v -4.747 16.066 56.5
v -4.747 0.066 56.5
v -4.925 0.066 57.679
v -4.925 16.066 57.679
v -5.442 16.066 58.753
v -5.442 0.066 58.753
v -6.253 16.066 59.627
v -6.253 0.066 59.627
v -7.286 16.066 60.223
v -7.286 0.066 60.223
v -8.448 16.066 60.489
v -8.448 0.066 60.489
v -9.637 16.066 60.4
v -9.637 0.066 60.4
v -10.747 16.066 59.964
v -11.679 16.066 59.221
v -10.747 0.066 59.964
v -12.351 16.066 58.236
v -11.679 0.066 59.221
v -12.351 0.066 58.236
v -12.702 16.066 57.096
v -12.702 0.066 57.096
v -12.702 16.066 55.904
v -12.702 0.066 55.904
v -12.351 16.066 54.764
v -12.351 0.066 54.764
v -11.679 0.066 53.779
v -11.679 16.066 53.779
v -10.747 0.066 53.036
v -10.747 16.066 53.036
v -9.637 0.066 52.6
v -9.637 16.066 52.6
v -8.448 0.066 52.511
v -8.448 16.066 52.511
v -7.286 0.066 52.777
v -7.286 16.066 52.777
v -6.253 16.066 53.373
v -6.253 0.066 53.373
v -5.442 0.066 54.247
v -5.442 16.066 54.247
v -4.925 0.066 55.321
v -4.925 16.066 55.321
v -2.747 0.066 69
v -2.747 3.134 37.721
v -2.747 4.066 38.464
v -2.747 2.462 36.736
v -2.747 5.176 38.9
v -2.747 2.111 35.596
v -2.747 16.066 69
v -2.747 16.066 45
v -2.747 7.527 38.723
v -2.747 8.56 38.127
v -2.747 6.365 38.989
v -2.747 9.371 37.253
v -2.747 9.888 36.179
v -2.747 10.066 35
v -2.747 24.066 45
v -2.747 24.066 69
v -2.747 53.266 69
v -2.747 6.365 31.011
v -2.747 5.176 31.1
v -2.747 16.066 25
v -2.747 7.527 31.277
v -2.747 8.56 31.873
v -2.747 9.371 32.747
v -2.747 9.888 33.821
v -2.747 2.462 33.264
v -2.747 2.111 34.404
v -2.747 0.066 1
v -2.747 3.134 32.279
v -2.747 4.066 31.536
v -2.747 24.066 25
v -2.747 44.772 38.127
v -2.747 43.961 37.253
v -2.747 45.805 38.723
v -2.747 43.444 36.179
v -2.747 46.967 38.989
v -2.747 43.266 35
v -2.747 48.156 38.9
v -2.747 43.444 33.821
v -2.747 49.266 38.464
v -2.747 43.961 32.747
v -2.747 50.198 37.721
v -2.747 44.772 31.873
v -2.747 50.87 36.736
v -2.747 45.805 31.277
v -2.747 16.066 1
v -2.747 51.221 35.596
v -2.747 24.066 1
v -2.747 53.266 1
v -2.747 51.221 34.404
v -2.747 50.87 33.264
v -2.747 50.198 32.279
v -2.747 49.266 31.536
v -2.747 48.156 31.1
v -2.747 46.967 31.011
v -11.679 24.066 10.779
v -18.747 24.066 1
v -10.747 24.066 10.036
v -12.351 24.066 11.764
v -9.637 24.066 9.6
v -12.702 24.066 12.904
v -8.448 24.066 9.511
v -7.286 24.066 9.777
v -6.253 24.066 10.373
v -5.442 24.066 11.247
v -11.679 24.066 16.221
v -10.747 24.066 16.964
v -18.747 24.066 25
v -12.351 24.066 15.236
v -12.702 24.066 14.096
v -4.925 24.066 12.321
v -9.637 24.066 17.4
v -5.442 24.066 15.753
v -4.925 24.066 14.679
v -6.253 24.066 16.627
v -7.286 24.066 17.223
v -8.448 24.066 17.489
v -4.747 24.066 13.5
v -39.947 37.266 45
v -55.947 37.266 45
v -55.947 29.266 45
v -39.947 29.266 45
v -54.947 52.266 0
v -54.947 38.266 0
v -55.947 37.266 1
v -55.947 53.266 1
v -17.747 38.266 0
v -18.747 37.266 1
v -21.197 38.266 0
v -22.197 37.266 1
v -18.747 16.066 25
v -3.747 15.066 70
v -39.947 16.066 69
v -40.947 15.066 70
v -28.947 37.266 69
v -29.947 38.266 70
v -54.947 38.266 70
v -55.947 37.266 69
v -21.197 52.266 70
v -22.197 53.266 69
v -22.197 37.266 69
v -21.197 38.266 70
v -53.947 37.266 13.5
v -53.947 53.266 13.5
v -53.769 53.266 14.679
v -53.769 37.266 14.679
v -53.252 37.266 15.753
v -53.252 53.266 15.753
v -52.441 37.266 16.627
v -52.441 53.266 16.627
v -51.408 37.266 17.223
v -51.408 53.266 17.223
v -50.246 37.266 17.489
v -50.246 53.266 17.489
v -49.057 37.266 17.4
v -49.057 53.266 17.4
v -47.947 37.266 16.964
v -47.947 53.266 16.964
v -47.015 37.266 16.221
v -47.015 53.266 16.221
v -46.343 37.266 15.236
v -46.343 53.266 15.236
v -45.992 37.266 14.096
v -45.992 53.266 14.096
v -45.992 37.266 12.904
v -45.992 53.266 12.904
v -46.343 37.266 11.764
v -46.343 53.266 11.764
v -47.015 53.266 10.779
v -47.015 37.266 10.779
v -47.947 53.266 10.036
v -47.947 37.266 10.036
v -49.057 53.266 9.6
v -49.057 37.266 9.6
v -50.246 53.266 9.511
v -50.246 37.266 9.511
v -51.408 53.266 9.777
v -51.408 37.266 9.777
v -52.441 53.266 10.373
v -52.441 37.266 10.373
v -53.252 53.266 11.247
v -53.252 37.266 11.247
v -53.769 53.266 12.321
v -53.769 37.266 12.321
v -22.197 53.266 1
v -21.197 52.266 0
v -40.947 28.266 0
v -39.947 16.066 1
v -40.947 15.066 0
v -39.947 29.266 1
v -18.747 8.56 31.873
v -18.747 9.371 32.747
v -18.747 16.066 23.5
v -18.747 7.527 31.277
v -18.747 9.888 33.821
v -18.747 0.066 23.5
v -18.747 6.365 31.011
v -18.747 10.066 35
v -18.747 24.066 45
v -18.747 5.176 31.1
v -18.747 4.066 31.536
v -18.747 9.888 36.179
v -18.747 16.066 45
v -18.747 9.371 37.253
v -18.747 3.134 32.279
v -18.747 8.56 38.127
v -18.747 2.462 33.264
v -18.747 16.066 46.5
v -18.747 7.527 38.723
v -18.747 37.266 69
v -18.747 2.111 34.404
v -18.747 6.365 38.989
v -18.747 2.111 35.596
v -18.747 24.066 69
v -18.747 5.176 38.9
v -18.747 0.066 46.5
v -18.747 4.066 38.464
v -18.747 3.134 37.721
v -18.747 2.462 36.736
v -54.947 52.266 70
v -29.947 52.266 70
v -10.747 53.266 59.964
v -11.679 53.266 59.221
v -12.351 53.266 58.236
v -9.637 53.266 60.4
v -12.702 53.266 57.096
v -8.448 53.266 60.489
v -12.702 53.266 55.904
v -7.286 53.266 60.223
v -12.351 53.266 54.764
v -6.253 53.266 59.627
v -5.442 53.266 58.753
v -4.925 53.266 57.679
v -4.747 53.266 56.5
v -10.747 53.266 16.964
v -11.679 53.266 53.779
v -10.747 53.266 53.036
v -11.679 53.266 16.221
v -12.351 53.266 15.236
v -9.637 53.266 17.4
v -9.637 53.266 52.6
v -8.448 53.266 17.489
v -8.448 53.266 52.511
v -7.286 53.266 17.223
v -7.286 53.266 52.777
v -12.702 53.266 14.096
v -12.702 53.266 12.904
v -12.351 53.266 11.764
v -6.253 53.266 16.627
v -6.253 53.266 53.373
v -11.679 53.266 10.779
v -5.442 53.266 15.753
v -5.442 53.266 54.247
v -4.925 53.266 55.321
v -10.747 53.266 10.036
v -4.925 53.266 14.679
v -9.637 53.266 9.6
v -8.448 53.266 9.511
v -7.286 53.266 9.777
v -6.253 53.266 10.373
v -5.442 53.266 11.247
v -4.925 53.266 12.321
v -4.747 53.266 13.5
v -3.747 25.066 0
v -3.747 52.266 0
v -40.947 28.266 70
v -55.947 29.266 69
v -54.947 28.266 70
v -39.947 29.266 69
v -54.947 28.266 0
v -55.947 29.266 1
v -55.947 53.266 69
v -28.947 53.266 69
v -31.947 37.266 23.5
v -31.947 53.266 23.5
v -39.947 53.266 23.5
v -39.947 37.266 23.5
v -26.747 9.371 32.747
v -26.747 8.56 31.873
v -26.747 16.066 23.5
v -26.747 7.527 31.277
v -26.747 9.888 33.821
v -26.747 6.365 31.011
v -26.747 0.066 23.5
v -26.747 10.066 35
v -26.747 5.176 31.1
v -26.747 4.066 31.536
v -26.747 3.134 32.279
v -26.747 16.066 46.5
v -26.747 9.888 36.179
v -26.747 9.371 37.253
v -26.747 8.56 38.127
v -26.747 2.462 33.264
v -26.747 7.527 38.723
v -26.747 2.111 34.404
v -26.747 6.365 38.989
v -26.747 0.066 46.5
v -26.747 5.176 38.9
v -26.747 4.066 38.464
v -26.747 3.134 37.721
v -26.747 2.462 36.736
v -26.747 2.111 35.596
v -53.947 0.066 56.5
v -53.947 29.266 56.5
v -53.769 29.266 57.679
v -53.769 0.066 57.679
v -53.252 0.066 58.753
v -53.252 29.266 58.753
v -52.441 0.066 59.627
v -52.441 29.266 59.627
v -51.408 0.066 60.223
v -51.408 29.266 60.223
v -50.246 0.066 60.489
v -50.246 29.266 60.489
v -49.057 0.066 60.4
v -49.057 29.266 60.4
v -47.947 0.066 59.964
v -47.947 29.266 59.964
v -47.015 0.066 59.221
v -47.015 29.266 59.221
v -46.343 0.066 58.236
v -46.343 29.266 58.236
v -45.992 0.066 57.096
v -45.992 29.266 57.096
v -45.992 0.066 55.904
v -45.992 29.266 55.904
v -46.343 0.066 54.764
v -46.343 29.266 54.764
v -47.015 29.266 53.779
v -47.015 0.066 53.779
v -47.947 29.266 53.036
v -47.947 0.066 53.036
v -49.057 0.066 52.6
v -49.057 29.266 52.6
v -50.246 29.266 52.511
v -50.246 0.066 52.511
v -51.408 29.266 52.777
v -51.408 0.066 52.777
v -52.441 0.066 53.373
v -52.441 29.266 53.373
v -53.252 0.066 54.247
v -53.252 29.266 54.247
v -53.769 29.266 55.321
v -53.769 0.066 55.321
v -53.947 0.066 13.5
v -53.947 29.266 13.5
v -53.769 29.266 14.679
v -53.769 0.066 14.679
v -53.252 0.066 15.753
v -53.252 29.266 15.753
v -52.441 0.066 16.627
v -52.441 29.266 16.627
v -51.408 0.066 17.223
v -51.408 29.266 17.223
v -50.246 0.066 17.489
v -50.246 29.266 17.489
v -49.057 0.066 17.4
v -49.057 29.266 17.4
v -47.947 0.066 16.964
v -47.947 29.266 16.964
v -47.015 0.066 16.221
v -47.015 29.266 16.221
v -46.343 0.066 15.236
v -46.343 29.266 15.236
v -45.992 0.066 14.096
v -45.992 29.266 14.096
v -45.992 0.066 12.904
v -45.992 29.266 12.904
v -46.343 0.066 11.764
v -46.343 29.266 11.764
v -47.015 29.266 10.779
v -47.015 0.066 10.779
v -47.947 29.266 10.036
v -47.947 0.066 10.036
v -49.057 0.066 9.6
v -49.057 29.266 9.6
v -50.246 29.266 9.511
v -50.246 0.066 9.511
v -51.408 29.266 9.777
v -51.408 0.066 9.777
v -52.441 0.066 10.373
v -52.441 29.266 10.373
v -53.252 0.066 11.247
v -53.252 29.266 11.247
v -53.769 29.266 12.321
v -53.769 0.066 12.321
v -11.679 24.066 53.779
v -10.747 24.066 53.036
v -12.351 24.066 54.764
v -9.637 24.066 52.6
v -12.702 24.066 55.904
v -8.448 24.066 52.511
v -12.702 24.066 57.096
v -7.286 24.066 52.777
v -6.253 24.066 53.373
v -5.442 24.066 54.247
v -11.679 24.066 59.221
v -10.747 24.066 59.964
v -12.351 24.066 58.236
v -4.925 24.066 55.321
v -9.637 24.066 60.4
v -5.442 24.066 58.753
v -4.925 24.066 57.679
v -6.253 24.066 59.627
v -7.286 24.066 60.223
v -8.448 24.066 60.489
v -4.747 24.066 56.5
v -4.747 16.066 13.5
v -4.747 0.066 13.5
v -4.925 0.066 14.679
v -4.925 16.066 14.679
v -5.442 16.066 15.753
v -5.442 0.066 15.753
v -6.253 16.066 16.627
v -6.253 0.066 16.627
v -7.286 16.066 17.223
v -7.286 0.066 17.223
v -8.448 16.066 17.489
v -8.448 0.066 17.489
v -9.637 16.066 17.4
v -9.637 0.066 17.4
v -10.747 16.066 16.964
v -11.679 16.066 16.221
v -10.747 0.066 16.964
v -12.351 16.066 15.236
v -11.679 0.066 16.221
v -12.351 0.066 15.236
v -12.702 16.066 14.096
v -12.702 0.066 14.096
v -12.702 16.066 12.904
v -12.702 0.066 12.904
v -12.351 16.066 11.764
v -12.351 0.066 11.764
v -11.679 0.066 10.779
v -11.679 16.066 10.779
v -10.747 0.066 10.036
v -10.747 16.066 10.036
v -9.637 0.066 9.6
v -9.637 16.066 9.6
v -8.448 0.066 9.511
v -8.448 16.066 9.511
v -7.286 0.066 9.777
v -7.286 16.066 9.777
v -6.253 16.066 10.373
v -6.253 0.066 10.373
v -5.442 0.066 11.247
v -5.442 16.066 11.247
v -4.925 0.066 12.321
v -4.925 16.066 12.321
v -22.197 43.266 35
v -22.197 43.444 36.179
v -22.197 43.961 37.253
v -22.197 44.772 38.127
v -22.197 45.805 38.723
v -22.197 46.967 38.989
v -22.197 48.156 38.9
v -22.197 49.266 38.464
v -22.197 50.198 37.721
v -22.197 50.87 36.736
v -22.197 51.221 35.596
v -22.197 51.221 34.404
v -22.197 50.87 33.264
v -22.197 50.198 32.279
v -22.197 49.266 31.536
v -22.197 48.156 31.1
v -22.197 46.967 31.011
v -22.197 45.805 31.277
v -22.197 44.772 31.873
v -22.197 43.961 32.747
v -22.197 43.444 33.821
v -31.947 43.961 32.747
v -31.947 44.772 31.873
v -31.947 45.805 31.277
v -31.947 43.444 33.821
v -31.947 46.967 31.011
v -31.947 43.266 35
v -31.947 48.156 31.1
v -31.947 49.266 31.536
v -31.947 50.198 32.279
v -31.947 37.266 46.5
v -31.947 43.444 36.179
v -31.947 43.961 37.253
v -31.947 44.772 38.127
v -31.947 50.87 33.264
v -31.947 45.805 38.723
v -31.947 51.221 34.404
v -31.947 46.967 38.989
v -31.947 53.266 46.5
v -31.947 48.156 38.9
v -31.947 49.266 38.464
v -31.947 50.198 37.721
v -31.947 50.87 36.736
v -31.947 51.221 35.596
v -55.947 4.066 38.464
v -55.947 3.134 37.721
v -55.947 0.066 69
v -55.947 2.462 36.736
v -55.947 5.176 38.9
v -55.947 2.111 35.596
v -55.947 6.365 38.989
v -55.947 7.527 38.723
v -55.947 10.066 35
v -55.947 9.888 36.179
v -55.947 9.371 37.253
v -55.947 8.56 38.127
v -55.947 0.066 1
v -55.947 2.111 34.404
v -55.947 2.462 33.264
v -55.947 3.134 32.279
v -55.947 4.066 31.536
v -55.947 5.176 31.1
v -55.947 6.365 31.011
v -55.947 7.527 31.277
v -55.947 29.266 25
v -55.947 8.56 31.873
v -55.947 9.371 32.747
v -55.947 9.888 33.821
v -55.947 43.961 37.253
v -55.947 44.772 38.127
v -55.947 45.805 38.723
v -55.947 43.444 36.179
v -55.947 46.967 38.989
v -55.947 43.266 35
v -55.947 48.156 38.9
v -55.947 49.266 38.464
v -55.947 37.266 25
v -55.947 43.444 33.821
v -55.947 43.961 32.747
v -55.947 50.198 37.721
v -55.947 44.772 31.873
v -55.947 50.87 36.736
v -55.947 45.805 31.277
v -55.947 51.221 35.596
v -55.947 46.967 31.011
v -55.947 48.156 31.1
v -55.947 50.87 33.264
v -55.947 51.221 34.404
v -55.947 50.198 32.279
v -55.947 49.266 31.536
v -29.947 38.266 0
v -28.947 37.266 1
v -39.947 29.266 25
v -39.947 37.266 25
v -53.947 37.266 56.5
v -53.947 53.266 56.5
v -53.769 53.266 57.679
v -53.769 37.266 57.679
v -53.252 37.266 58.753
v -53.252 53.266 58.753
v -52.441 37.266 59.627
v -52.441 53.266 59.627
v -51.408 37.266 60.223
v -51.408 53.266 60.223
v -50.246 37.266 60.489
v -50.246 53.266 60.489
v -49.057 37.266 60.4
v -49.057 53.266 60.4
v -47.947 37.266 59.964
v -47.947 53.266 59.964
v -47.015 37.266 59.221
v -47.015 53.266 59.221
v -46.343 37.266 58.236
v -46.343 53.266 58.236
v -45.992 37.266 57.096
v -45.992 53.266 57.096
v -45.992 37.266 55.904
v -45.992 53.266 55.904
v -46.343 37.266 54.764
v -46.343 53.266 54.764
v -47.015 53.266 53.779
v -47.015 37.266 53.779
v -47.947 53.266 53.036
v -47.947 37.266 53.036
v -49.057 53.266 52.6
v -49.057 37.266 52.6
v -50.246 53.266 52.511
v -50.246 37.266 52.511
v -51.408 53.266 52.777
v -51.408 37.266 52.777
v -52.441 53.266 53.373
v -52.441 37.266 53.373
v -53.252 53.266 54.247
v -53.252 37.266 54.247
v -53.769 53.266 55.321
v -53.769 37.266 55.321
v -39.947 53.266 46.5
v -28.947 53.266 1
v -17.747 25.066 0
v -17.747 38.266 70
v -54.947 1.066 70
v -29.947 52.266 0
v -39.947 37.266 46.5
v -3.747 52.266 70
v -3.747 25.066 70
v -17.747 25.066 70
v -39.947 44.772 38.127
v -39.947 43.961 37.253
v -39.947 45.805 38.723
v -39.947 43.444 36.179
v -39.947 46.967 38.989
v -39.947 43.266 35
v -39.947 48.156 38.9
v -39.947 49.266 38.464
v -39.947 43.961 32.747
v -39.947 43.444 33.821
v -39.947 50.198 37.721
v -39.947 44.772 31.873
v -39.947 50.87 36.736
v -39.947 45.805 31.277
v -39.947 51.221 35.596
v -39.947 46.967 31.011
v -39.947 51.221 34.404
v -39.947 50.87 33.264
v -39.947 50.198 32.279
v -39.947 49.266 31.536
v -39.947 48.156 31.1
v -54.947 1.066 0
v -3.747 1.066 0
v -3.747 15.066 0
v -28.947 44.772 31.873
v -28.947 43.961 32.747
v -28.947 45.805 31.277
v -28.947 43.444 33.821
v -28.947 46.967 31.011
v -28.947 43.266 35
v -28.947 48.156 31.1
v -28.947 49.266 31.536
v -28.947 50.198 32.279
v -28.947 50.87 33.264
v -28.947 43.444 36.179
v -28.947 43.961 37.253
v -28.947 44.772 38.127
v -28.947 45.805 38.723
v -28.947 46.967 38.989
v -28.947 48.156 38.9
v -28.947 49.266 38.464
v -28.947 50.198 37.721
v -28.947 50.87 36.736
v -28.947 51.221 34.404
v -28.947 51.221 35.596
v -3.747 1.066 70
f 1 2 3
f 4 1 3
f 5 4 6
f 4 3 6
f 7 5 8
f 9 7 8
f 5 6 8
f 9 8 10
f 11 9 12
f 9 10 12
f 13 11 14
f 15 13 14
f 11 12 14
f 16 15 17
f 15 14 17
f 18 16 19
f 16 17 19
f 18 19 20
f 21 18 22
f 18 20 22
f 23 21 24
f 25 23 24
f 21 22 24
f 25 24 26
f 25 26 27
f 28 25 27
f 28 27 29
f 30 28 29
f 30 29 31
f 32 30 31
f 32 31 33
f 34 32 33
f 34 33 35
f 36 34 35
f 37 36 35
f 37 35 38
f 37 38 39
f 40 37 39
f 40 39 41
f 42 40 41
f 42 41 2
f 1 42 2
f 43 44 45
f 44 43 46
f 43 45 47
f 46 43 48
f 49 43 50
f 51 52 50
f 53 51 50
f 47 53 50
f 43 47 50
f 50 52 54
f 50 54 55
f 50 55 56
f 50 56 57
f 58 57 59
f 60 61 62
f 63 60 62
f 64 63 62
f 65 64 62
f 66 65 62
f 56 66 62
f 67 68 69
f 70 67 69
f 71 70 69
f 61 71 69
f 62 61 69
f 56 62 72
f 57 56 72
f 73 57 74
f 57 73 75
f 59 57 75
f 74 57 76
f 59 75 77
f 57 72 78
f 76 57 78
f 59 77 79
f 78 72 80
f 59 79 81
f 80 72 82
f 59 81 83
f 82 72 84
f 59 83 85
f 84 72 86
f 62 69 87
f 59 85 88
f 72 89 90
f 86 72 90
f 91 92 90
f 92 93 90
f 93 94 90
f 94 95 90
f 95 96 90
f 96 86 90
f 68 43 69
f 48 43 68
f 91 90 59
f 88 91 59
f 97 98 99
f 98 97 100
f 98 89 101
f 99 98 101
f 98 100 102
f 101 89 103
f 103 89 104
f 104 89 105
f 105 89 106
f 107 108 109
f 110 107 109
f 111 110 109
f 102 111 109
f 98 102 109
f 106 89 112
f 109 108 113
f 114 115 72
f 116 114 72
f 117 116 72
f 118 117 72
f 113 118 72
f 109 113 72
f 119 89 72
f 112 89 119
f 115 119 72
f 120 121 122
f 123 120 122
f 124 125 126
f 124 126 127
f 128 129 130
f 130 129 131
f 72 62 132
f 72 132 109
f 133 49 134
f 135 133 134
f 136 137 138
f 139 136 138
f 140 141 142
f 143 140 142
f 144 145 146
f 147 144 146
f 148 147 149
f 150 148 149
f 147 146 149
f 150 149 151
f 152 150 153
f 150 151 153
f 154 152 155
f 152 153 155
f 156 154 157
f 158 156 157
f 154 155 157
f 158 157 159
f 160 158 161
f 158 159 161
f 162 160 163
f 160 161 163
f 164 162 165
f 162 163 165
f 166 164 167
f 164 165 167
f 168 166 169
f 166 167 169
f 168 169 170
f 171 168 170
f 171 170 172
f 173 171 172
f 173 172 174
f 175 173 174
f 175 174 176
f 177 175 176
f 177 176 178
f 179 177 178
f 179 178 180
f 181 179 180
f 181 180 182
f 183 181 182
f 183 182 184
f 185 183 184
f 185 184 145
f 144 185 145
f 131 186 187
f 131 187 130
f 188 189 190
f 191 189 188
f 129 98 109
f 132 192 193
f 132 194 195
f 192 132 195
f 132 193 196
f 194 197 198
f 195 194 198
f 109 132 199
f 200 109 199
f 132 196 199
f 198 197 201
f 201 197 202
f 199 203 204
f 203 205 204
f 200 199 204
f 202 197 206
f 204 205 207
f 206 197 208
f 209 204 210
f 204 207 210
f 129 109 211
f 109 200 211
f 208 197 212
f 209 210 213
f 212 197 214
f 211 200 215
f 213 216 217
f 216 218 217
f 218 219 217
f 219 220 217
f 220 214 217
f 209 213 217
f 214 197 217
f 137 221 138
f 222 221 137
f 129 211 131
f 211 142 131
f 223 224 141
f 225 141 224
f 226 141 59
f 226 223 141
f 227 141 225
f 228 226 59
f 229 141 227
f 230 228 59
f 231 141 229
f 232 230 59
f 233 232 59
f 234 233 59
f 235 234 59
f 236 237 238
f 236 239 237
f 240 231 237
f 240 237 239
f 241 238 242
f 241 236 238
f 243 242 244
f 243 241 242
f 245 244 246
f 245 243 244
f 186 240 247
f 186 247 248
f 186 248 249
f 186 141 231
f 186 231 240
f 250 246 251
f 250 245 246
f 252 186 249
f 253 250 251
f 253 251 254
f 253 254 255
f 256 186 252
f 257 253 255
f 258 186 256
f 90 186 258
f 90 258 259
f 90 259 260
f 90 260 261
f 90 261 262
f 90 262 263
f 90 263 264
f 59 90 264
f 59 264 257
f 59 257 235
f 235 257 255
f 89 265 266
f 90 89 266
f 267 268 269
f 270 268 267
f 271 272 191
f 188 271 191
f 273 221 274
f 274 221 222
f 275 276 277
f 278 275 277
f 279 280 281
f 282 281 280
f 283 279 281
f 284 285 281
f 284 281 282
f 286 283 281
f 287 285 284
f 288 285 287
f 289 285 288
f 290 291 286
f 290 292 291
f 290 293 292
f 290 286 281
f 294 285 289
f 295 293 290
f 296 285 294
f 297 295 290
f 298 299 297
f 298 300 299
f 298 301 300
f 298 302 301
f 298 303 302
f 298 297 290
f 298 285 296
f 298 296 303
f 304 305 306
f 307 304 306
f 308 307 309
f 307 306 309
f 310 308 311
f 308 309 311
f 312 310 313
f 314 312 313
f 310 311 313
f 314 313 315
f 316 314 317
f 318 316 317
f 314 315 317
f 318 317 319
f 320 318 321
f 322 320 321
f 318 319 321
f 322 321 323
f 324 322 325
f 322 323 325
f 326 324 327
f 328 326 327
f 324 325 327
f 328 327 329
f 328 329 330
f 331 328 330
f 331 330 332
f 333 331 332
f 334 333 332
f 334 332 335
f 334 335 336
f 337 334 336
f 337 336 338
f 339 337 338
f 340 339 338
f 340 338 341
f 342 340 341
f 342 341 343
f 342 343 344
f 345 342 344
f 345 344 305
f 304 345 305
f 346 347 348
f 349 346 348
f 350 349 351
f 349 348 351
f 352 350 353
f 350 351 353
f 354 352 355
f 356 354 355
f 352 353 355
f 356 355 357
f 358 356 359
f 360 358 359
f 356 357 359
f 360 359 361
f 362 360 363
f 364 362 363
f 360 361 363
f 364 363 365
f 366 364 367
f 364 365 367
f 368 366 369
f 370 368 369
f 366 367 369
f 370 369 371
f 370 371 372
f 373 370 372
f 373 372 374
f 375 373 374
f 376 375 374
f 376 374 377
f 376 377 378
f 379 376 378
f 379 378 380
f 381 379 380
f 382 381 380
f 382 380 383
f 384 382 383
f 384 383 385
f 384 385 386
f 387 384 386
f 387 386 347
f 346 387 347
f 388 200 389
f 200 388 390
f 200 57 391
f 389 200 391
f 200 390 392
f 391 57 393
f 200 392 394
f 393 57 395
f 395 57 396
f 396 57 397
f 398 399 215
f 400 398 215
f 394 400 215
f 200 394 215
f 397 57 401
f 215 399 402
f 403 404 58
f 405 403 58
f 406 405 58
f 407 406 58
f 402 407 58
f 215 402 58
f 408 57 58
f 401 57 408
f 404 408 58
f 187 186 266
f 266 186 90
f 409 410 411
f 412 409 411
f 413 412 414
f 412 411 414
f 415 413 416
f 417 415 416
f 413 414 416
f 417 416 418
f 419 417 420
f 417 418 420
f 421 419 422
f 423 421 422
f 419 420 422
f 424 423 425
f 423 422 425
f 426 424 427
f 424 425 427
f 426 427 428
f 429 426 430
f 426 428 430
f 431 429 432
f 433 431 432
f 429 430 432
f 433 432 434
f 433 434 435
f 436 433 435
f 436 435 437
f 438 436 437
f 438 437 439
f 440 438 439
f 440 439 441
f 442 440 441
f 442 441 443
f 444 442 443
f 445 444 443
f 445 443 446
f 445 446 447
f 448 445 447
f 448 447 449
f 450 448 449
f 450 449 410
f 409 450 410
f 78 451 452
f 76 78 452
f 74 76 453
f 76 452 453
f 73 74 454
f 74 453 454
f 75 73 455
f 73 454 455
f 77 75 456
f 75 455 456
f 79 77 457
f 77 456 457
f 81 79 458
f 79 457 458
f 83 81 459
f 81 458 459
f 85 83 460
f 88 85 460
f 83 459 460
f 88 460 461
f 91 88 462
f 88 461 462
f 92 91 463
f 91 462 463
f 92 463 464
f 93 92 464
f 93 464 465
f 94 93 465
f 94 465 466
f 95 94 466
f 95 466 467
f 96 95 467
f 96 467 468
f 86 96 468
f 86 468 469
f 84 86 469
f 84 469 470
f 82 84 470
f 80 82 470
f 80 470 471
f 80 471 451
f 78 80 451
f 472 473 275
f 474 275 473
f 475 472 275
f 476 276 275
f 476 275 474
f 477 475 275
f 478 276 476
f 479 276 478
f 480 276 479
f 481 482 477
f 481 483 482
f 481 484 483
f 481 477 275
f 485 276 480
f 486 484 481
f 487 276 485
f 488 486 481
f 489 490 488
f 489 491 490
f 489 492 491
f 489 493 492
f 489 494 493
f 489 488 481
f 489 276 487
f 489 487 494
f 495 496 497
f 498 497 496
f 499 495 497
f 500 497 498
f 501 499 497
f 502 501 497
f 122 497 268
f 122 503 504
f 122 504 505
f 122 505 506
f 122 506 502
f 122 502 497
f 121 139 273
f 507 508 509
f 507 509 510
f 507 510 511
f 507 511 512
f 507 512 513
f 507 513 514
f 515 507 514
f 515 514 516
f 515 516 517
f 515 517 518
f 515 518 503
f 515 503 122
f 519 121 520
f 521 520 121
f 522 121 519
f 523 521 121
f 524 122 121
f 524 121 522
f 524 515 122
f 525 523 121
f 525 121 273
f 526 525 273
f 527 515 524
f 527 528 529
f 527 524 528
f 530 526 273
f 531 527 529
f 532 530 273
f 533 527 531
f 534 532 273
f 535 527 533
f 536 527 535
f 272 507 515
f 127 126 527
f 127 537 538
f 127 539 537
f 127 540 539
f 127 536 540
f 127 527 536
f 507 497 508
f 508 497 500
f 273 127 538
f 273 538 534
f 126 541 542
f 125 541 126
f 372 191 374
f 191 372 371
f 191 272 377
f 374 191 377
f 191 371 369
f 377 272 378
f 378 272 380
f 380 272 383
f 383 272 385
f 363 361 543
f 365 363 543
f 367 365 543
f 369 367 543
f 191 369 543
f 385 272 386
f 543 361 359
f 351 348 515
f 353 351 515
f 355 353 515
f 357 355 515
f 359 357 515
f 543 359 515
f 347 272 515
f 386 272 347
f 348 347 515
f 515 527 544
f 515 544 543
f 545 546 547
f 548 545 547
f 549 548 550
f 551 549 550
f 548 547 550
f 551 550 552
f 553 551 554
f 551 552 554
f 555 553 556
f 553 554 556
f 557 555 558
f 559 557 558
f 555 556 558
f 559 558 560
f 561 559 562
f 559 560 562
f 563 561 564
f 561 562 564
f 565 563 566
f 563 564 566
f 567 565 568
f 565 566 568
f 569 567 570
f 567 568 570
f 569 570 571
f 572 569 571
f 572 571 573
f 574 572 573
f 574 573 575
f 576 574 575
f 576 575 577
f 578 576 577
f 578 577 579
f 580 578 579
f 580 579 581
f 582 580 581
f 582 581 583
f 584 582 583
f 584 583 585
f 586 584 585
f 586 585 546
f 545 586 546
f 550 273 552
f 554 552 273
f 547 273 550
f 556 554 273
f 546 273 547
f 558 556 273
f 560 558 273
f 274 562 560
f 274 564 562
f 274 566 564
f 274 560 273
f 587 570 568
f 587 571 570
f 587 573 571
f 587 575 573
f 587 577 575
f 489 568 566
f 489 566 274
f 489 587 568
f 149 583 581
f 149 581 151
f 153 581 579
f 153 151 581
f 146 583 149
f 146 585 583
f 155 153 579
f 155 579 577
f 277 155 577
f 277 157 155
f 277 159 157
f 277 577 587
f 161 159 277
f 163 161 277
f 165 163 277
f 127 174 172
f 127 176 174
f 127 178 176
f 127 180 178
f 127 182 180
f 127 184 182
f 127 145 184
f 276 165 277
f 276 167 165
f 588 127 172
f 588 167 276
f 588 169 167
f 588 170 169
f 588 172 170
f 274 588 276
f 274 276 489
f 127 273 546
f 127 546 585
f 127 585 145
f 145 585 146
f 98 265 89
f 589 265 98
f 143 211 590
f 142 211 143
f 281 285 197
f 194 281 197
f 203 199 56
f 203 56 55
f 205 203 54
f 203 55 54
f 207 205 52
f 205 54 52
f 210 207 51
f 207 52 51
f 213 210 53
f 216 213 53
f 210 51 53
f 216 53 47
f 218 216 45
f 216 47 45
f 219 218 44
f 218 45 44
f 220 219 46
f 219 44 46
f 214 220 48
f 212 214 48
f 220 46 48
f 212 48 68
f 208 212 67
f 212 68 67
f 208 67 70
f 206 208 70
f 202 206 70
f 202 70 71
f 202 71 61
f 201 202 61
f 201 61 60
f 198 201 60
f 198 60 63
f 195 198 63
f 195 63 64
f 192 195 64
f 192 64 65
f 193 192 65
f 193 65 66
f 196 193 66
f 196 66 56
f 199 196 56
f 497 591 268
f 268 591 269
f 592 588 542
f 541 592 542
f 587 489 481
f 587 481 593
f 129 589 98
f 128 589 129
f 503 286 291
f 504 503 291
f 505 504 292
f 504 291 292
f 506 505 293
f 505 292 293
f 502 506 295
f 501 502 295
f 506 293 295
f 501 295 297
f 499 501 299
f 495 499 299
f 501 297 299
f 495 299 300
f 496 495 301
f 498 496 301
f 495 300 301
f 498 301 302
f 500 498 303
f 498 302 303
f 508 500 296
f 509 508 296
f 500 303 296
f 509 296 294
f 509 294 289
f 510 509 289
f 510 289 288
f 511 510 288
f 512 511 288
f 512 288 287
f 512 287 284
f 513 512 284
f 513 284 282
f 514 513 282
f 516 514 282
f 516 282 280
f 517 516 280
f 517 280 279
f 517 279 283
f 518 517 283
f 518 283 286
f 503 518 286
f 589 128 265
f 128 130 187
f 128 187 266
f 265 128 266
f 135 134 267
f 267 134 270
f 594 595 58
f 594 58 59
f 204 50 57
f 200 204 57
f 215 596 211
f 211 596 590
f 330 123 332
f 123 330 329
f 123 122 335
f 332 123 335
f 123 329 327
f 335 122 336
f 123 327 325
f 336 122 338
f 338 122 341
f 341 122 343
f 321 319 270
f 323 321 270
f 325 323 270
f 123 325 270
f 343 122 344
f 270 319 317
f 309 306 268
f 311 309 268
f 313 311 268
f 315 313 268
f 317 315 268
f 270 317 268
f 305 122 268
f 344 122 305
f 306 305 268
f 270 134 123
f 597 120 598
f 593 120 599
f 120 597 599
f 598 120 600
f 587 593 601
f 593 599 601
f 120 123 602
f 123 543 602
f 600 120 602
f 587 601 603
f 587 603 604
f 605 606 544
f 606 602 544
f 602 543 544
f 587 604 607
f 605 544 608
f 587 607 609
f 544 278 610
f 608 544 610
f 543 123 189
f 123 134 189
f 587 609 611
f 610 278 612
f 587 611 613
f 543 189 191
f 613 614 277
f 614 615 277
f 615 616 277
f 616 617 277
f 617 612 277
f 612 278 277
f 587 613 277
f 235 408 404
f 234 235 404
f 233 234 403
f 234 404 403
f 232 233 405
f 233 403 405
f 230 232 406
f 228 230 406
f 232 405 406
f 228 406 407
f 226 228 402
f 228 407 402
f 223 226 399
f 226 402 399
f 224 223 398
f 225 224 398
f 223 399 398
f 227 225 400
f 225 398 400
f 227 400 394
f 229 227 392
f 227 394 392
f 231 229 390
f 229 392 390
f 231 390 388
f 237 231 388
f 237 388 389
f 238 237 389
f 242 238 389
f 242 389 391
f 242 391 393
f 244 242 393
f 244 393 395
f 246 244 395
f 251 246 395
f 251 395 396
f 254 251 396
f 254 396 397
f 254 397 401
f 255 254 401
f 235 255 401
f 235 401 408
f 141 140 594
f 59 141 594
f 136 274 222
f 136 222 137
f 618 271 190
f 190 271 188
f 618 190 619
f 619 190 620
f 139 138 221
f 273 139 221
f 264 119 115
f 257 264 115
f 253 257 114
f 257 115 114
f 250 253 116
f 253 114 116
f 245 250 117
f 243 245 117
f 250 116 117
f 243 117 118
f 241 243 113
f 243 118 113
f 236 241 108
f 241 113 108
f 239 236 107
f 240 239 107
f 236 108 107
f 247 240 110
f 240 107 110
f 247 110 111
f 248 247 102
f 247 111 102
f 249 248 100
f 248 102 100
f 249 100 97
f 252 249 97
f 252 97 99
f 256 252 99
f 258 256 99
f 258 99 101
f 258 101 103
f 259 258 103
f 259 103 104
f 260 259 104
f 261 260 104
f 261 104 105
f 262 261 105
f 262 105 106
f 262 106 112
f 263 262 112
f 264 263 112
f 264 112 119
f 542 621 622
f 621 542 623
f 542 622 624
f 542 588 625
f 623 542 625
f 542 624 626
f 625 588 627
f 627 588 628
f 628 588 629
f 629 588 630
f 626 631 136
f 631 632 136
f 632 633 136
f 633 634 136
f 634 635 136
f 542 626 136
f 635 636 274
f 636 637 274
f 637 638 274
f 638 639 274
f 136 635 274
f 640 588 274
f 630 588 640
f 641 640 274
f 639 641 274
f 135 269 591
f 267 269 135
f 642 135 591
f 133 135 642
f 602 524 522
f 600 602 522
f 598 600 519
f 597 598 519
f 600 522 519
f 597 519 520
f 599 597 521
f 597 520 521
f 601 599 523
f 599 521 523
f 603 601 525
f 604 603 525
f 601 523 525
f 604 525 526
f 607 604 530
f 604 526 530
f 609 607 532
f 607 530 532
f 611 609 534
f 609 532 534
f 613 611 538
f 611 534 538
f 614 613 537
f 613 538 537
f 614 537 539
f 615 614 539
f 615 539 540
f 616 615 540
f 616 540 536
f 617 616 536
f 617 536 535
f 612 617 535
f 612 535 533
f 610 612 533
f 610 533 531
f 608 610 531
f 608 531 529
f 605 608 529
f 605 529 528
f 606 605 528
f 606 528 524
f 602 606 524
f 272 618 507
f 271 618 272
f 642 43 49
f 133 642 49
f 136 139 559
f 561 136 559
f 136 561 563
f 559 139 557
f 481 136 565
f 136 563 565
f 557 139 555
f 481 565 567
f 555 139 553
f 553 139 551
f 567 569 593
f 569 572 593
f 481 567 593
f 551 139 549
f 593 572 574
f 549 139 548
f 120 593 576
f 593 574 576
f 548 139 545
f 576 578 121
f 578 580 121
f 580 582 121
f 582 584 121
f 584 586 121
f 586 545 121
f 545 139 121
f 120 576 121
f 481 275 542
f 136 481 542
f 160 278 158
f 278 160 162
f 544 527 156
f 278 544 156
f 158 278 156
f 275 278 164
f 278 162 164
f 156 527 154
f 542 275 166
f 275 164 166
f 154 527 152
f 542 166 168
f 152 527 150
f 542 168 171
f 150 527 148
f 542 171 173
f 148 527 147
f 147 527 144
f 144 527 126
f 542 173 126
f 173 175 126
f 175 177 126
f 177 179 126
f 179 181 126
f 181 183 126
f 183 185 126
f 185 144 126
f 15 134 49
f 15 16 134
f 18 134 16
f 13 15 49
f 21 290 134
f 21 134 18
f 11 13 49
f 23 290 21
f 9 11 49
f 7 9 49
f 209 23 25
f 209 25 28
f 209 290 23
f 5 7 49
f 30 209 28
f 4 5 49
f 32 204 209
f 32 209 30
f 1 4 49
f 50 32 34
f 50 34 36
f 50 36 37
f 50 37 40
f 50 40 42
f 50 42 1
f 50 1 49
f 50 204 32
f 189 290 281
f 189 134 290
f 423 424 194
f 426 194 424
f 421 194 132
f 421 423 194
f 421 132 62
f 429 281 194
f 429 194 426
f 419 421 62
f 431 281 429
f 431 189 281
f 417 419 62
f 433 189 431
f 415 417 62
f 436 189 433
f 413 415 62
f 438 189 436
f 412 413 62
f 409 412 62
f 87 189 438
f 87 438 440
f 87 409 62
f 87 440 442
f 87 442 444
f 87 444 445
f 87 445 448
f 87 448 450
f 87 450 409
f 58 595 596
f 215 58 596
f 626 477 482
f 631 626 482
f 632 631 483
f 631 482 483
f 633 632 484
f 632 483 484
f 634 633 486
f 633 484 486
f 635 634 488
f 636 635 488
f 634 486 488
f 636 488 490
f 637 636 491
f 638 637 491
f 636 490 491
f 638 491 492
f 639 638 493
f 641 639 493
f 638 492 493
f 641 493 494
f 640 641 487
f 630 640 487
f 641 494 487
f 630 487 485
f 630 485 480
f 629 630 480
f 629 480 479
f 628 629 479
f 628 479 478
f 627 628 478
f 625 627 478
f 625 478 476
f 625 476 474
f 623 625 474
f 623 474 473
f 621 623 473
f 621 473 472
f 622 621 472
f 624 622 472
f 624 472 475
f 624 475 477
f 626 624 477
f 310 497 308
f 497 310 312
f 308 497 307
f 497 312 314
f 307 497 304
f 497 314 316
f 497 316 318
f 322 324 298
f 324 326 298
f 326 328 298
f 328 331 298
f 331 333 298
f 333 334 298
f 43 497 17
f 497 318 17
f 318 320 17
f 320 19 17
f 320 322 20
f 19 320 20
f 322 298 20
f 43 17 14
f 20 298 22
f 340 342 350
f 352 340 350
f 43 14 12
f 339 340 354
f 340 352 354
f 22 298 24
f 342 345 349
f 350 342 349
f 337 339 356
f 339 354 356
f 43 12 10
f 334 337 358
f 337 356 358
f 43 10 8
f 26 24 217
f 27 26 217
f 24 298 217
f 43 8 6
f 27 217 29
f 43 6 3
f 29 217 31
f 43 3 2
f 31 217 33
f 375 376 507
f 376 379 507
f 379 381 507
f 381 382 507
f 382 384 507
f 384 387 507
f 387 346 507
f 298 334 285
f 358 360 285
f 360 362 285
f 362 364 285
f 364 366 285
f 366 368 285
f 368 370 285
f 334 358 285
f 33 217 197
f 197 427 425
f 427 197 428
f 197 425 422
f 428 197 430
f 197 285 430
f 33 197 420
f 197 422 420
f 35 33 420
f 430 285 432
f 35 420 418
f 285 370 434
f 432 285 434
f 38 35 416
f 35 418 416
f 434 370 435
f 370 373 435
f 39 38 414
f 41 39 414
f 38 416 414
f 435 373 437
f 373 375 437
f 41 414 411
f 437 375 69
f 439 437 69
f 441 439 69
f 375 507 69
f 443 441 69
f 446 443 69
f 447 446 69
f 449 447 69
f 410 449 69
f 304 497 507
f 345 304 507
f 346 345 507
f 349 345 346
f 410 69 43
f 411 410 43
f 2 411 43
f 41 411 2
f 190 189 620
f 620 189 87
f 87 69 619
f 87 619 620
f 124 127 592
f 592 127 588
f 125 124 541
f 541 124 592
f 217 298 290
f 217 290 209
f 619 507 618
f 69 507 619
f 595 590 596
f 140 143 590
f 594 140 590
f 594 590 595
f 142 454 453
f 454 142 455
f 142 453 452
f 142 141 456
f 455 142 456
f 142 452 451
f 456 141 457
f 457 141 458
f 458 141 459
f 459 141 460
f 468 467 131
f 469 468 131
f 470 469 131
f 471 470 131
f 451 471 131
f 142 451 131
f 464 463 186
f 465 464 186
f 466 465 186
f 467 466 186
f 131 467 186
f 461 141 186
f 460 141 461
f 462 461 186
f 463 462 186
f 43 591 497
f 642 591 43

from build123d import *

# Parameters (mm, degrees)
F0_W      = 53.2
F0_H      = 53.2
F0_W_2    = 21.2
F0_H_2    = 21.2
F1_DEPTH  = 70
F2_W      = 8
F2_H      = 7.5
F2_H_2    = 8
F2_H_3    = 2
F4_DEPTH  = 24
F3_W      = 8
F3_H      = 23
F5_DEPTH  = 25
F2_R      = 4
F6_DEPTH  = 90
F7_W      = 8
F7_H      = 7.5
F7_H_2    = 2
F7_H_3    = 8
F8_DEPTH  = 25
F3_R      = 4
F9_DEPTH  = 100
F7_R      = 4
F10_DEPTH = 90
F11_W     = 8
F11_H     = 23
F12_DEPTH = 25
F11_R     = 4
F13_DEPTH = 90
F15_DEPTH = 25
F16_SIZE  = 1


# Not quite as in the source:
# - a feature names something its author has since deleted; it is built from what else it names


with BuildPart() as f1:
    # F0 (on Top) → F1 (new body)
    with BuildSketch(Plane.XY):
        with Locations((-29.3469955068, 26.6660622075)):
            Rectangle(F0_W, F0_H)
        with Locations((-29.3469955068, 26.6660622075)):
            Rectangle(F0_W_2, F0_H_2, mode=Mode.SUBTRACT)
    extrude(amount=F1_DEPTH)

    # F2 (on face) → F4 (cut)
    with BuildSketch(Plane(origin=(-55.9469955068, 0, 0), x_dir=(0, -1, 0), z_dir=(-1, 0, 0))):
        with Locations((-33.2660622075, 48.75)):
            Rectangle(F2_W, F2_H)
        with Locations((-33.2660622075, 56.5)):
            Rectangle(F2_W, F2_H_2)
        with Locations((-33.2660622075, 64.25)):
            Rectangle(F2_W, F2_H)
        with Locations((-33.2660622075, 69)):
            Rectangle(F2_W, F2_H_3)
        with Locations((-33.2660622075, 1)):
            Rectangle(F2_W, F2_H_3)
        with Locations((-33.2660622075, 5.75)):
            Rectangle(F2_W, F2_H)
        with Locations((-33.2660622075, 13.5)):
            Rectangle(F2_W, F2_H_2)
        with Locations((-33.2660622075, 21.25)):
            Rectangle(F2_W, F2_H)
    extrude(amount=-F4_DEPTH, mode=Mode.SUBTRACT)

    # F3 (on face) → F5 (cut)
    with BuildSketch(Plane(origin=(0, 53.2660622075, 0), x_dir=(-1, 0, 0), z_dir=(0, 1, 0))):
        with Locations((35.9469955068, 35)):
            Rectangle(F3_W, F3_H)
    extrude(amount=-F5_DEPTH, mode=Mode.SUBTRACT)

    # F2 (on face) → F6 (cut)
    with BuildSketch(Plane(origin=(-55.9469955068, 0, 0), x_dir=(0, -1, 0), z_dir=(-1, 0, 0))):
        with Locations((-47.2660622075, 35)):
            Circle(F2_R)
    extrude(amount=-F6_DEPTH, mode=Mode.SUBTRACT)

    # F7 (on face) → F8 (cut)
    with BuildSketch(Plane.YZ.offset(-2.7469955068)):
        with Locations((20.0660622075, 48.75)):
            Rectangle(F7_W, F7_H)
        with Locations((20.0660622075, 69)):
            Rectangle(F7_W, F7_H_2)
        with Locations((20.0660622075, 21.25)):
            Rectangle(F7_W, F7_H)
        with Locations((20.0660622075, 1)):
            Rectangle(F7_W, F7_H_2)
        with Locations((20.0660622075, 56.5)):
            Rectangle(F7_W, F7_H_3)
        with Locations((20.0660622075, 64.25)):
            Rectangle(F7_W, F7_H)
        with Locations((20.0660622075, 13.5)):
            Rectangle(F7_W, F7_H_3)
        with Locations((20.0660622075, 5.75)):
            Rectangle(F7_W, F7_H)
    extrude(amount=-F8_DEPTH, mode=Mode.SUBTRACT)

    # F3 (on face) → F9 (cut)
    with BuildSketch(Plane(origin=(0, 53.2660622075, 0), x_dir=(-1, 0, 0), z_dir=(0, 1, 0))):
        with Locations((49.9469955068, 56.5)):
            Circle(F3_R)
        with Locations((49.9469955068, 13.5)):
            Circle(F3_R)
    extrude(amount=-F9_DEPTH, mode=Mode.SUBTRACT)

    # F7 (on face) → F10 (cut)
    with BuildSketch(Plane.YZ.offset(-2.7469955068)):
        with Locations((6.0660622075, 35)):
            Circle(F7_R)
    extrude(amount=-F10_DEPTH, mode=Mode.SUBTRACT)

    # F11 (on face) → F12 (cut)
    with BuildSketch(Plane.XZ.offset(-0.0660622075)):
        with Locations((-22.7469955068, 35)):
            Rectangle(F11_W, F11_H)
    extrude(amount=-F12_DEPTH, mode=Mode.SUBTRACT)

    # F11 (on face) → F13 (cut)
    with BuildSketch(Plane.XZ.offset(-0.0660622075)):
        with Locations((-8.7469955068, 13.5)):
            Circle(F11_R)
        with Locations((-8.7469955068, 56.5)):
            Circle(F11_R)
    extrude(amount=-F13_DEPTH, mode=Mode.SUBTRACT)

    # F14 (on face) → F15 (cut)
    with BuildSketch(Plane(origin=(0, 53.2660622075, 0), x_dir=(-1, 0, 0), z_dir=(0, 1, 0))):
        Polygon((28.9469955068, 0), (22.1969955068, 17.5), (22.1969955068, 0), align=None)
        Polygon((27.4469955068, 35), (22.1969955068, 45.5), (22.1969955068, 24.5), align=None)
        Polygon((28.9469955068, 17.5), (24.8022586647, 17.5), (28.9469955068, 8.75), align=None)
        Polygon((28.9469955068, 52.5), (28.9469955068, 61.25), (24.8022586647, 52.5), align=None)
        Polygon((22.1969955068, 23), (24.8022586647, 17.5), (28.9469955068, 17.5), (28.9469955068, 33.5), align=None)
        Polygon((28.9469955068, 52.5), (24.8022586647, 52.5), (22.1969955068, 47), (28.9469955068, 36.5), align=None)
        Polygon((28.9469955068, 36.5), (22.1969955068, 47), (22.1969955068, 45.5), (27.4469955068, 35), (22.1969955068, 24.5), (22.1969955068, 23), (28.9469955068, 33.5), align=None)
        Polygon((24.8022586647, 17.5), (22.1969955068, 17.5), (28.9469955068, 0), (28.9469955068, 8.75), align=None)
        Polygon((24.8022586647, 52.5), (22.1969955068, 52.5), (22.1969955068, 47), align=None)
        Polygon((22.1969955068, 23), (22.1969955068, 17.5), (24.8022586647, 17.5), align=None)
        Polygon((28.9469955068, 70), (22.1969955068, 70), (22.1969955068, 52.5), align=None)
        Polygon((28.9469955068, 61.25), (28.9469955068, 70), (22.1969955068, 52.5), (24.8022586647, 52.5), align=None)
    extrude(amount=-F15_DEPTH, mode=Mode.SUBTRACT)

    # F16
    f16_edges = [f1.edges().sort_by_distance(p)[0] for p in [
        (-28.946996, 45.266062, 0),
        (-42.446996, 37.266062, 0),
        (-55.946996, 45.266062, 0),
        (-42.446996, 53.266062, 0),
        (-10.746996, 24.066062, 0),
        (-18.746996, 30.666062, 0),
        (-20.471996, 37.266062, 0),
        (-22.196996, 45.266062, 0),
        (-12.471996, 53.266062, 0),
        (-2.746996, 38.666062, 0),
        (-29.346996, 0.066062, 0),
        (-2.746996, 8.066062, 0),
        (-21.346996, 16.066062, 0),
        (-39.946996, 22.666062, 0),
        (-47.946996, 29.266062, 0),
        (-55.946996, 14.666062, 0),
        (-28.946996, 45.266062, 70),
        (-42.446996, 37.266062, 70),
        (-55.946996, 45.266062, 70),
        (-42.446996, 53.266062, 70),
        (-29.346996, 0.066062, 70),
        (-2.746996, 8.066062, 70),
        (-21.346996, 16.066062, 70),
        (-39.946996, 22.666062, 70),
        (-47.946996, 29.266062, 70),
        (-55.946996, 14.666062, 70),
        (-10.746996, 24.066062, 70),
        (-18.746996, 30.666062, 70),
        (-20.471996, 37.266062, 70),
        (-22.196996, 45.266062, 70),
        (-12.471996, 53.266062, 70),
        (-2.746996, 38.666062, 70),
    ]]
    chamfer(f16_edges, length=F16_SIZE)


solid = f1.part
